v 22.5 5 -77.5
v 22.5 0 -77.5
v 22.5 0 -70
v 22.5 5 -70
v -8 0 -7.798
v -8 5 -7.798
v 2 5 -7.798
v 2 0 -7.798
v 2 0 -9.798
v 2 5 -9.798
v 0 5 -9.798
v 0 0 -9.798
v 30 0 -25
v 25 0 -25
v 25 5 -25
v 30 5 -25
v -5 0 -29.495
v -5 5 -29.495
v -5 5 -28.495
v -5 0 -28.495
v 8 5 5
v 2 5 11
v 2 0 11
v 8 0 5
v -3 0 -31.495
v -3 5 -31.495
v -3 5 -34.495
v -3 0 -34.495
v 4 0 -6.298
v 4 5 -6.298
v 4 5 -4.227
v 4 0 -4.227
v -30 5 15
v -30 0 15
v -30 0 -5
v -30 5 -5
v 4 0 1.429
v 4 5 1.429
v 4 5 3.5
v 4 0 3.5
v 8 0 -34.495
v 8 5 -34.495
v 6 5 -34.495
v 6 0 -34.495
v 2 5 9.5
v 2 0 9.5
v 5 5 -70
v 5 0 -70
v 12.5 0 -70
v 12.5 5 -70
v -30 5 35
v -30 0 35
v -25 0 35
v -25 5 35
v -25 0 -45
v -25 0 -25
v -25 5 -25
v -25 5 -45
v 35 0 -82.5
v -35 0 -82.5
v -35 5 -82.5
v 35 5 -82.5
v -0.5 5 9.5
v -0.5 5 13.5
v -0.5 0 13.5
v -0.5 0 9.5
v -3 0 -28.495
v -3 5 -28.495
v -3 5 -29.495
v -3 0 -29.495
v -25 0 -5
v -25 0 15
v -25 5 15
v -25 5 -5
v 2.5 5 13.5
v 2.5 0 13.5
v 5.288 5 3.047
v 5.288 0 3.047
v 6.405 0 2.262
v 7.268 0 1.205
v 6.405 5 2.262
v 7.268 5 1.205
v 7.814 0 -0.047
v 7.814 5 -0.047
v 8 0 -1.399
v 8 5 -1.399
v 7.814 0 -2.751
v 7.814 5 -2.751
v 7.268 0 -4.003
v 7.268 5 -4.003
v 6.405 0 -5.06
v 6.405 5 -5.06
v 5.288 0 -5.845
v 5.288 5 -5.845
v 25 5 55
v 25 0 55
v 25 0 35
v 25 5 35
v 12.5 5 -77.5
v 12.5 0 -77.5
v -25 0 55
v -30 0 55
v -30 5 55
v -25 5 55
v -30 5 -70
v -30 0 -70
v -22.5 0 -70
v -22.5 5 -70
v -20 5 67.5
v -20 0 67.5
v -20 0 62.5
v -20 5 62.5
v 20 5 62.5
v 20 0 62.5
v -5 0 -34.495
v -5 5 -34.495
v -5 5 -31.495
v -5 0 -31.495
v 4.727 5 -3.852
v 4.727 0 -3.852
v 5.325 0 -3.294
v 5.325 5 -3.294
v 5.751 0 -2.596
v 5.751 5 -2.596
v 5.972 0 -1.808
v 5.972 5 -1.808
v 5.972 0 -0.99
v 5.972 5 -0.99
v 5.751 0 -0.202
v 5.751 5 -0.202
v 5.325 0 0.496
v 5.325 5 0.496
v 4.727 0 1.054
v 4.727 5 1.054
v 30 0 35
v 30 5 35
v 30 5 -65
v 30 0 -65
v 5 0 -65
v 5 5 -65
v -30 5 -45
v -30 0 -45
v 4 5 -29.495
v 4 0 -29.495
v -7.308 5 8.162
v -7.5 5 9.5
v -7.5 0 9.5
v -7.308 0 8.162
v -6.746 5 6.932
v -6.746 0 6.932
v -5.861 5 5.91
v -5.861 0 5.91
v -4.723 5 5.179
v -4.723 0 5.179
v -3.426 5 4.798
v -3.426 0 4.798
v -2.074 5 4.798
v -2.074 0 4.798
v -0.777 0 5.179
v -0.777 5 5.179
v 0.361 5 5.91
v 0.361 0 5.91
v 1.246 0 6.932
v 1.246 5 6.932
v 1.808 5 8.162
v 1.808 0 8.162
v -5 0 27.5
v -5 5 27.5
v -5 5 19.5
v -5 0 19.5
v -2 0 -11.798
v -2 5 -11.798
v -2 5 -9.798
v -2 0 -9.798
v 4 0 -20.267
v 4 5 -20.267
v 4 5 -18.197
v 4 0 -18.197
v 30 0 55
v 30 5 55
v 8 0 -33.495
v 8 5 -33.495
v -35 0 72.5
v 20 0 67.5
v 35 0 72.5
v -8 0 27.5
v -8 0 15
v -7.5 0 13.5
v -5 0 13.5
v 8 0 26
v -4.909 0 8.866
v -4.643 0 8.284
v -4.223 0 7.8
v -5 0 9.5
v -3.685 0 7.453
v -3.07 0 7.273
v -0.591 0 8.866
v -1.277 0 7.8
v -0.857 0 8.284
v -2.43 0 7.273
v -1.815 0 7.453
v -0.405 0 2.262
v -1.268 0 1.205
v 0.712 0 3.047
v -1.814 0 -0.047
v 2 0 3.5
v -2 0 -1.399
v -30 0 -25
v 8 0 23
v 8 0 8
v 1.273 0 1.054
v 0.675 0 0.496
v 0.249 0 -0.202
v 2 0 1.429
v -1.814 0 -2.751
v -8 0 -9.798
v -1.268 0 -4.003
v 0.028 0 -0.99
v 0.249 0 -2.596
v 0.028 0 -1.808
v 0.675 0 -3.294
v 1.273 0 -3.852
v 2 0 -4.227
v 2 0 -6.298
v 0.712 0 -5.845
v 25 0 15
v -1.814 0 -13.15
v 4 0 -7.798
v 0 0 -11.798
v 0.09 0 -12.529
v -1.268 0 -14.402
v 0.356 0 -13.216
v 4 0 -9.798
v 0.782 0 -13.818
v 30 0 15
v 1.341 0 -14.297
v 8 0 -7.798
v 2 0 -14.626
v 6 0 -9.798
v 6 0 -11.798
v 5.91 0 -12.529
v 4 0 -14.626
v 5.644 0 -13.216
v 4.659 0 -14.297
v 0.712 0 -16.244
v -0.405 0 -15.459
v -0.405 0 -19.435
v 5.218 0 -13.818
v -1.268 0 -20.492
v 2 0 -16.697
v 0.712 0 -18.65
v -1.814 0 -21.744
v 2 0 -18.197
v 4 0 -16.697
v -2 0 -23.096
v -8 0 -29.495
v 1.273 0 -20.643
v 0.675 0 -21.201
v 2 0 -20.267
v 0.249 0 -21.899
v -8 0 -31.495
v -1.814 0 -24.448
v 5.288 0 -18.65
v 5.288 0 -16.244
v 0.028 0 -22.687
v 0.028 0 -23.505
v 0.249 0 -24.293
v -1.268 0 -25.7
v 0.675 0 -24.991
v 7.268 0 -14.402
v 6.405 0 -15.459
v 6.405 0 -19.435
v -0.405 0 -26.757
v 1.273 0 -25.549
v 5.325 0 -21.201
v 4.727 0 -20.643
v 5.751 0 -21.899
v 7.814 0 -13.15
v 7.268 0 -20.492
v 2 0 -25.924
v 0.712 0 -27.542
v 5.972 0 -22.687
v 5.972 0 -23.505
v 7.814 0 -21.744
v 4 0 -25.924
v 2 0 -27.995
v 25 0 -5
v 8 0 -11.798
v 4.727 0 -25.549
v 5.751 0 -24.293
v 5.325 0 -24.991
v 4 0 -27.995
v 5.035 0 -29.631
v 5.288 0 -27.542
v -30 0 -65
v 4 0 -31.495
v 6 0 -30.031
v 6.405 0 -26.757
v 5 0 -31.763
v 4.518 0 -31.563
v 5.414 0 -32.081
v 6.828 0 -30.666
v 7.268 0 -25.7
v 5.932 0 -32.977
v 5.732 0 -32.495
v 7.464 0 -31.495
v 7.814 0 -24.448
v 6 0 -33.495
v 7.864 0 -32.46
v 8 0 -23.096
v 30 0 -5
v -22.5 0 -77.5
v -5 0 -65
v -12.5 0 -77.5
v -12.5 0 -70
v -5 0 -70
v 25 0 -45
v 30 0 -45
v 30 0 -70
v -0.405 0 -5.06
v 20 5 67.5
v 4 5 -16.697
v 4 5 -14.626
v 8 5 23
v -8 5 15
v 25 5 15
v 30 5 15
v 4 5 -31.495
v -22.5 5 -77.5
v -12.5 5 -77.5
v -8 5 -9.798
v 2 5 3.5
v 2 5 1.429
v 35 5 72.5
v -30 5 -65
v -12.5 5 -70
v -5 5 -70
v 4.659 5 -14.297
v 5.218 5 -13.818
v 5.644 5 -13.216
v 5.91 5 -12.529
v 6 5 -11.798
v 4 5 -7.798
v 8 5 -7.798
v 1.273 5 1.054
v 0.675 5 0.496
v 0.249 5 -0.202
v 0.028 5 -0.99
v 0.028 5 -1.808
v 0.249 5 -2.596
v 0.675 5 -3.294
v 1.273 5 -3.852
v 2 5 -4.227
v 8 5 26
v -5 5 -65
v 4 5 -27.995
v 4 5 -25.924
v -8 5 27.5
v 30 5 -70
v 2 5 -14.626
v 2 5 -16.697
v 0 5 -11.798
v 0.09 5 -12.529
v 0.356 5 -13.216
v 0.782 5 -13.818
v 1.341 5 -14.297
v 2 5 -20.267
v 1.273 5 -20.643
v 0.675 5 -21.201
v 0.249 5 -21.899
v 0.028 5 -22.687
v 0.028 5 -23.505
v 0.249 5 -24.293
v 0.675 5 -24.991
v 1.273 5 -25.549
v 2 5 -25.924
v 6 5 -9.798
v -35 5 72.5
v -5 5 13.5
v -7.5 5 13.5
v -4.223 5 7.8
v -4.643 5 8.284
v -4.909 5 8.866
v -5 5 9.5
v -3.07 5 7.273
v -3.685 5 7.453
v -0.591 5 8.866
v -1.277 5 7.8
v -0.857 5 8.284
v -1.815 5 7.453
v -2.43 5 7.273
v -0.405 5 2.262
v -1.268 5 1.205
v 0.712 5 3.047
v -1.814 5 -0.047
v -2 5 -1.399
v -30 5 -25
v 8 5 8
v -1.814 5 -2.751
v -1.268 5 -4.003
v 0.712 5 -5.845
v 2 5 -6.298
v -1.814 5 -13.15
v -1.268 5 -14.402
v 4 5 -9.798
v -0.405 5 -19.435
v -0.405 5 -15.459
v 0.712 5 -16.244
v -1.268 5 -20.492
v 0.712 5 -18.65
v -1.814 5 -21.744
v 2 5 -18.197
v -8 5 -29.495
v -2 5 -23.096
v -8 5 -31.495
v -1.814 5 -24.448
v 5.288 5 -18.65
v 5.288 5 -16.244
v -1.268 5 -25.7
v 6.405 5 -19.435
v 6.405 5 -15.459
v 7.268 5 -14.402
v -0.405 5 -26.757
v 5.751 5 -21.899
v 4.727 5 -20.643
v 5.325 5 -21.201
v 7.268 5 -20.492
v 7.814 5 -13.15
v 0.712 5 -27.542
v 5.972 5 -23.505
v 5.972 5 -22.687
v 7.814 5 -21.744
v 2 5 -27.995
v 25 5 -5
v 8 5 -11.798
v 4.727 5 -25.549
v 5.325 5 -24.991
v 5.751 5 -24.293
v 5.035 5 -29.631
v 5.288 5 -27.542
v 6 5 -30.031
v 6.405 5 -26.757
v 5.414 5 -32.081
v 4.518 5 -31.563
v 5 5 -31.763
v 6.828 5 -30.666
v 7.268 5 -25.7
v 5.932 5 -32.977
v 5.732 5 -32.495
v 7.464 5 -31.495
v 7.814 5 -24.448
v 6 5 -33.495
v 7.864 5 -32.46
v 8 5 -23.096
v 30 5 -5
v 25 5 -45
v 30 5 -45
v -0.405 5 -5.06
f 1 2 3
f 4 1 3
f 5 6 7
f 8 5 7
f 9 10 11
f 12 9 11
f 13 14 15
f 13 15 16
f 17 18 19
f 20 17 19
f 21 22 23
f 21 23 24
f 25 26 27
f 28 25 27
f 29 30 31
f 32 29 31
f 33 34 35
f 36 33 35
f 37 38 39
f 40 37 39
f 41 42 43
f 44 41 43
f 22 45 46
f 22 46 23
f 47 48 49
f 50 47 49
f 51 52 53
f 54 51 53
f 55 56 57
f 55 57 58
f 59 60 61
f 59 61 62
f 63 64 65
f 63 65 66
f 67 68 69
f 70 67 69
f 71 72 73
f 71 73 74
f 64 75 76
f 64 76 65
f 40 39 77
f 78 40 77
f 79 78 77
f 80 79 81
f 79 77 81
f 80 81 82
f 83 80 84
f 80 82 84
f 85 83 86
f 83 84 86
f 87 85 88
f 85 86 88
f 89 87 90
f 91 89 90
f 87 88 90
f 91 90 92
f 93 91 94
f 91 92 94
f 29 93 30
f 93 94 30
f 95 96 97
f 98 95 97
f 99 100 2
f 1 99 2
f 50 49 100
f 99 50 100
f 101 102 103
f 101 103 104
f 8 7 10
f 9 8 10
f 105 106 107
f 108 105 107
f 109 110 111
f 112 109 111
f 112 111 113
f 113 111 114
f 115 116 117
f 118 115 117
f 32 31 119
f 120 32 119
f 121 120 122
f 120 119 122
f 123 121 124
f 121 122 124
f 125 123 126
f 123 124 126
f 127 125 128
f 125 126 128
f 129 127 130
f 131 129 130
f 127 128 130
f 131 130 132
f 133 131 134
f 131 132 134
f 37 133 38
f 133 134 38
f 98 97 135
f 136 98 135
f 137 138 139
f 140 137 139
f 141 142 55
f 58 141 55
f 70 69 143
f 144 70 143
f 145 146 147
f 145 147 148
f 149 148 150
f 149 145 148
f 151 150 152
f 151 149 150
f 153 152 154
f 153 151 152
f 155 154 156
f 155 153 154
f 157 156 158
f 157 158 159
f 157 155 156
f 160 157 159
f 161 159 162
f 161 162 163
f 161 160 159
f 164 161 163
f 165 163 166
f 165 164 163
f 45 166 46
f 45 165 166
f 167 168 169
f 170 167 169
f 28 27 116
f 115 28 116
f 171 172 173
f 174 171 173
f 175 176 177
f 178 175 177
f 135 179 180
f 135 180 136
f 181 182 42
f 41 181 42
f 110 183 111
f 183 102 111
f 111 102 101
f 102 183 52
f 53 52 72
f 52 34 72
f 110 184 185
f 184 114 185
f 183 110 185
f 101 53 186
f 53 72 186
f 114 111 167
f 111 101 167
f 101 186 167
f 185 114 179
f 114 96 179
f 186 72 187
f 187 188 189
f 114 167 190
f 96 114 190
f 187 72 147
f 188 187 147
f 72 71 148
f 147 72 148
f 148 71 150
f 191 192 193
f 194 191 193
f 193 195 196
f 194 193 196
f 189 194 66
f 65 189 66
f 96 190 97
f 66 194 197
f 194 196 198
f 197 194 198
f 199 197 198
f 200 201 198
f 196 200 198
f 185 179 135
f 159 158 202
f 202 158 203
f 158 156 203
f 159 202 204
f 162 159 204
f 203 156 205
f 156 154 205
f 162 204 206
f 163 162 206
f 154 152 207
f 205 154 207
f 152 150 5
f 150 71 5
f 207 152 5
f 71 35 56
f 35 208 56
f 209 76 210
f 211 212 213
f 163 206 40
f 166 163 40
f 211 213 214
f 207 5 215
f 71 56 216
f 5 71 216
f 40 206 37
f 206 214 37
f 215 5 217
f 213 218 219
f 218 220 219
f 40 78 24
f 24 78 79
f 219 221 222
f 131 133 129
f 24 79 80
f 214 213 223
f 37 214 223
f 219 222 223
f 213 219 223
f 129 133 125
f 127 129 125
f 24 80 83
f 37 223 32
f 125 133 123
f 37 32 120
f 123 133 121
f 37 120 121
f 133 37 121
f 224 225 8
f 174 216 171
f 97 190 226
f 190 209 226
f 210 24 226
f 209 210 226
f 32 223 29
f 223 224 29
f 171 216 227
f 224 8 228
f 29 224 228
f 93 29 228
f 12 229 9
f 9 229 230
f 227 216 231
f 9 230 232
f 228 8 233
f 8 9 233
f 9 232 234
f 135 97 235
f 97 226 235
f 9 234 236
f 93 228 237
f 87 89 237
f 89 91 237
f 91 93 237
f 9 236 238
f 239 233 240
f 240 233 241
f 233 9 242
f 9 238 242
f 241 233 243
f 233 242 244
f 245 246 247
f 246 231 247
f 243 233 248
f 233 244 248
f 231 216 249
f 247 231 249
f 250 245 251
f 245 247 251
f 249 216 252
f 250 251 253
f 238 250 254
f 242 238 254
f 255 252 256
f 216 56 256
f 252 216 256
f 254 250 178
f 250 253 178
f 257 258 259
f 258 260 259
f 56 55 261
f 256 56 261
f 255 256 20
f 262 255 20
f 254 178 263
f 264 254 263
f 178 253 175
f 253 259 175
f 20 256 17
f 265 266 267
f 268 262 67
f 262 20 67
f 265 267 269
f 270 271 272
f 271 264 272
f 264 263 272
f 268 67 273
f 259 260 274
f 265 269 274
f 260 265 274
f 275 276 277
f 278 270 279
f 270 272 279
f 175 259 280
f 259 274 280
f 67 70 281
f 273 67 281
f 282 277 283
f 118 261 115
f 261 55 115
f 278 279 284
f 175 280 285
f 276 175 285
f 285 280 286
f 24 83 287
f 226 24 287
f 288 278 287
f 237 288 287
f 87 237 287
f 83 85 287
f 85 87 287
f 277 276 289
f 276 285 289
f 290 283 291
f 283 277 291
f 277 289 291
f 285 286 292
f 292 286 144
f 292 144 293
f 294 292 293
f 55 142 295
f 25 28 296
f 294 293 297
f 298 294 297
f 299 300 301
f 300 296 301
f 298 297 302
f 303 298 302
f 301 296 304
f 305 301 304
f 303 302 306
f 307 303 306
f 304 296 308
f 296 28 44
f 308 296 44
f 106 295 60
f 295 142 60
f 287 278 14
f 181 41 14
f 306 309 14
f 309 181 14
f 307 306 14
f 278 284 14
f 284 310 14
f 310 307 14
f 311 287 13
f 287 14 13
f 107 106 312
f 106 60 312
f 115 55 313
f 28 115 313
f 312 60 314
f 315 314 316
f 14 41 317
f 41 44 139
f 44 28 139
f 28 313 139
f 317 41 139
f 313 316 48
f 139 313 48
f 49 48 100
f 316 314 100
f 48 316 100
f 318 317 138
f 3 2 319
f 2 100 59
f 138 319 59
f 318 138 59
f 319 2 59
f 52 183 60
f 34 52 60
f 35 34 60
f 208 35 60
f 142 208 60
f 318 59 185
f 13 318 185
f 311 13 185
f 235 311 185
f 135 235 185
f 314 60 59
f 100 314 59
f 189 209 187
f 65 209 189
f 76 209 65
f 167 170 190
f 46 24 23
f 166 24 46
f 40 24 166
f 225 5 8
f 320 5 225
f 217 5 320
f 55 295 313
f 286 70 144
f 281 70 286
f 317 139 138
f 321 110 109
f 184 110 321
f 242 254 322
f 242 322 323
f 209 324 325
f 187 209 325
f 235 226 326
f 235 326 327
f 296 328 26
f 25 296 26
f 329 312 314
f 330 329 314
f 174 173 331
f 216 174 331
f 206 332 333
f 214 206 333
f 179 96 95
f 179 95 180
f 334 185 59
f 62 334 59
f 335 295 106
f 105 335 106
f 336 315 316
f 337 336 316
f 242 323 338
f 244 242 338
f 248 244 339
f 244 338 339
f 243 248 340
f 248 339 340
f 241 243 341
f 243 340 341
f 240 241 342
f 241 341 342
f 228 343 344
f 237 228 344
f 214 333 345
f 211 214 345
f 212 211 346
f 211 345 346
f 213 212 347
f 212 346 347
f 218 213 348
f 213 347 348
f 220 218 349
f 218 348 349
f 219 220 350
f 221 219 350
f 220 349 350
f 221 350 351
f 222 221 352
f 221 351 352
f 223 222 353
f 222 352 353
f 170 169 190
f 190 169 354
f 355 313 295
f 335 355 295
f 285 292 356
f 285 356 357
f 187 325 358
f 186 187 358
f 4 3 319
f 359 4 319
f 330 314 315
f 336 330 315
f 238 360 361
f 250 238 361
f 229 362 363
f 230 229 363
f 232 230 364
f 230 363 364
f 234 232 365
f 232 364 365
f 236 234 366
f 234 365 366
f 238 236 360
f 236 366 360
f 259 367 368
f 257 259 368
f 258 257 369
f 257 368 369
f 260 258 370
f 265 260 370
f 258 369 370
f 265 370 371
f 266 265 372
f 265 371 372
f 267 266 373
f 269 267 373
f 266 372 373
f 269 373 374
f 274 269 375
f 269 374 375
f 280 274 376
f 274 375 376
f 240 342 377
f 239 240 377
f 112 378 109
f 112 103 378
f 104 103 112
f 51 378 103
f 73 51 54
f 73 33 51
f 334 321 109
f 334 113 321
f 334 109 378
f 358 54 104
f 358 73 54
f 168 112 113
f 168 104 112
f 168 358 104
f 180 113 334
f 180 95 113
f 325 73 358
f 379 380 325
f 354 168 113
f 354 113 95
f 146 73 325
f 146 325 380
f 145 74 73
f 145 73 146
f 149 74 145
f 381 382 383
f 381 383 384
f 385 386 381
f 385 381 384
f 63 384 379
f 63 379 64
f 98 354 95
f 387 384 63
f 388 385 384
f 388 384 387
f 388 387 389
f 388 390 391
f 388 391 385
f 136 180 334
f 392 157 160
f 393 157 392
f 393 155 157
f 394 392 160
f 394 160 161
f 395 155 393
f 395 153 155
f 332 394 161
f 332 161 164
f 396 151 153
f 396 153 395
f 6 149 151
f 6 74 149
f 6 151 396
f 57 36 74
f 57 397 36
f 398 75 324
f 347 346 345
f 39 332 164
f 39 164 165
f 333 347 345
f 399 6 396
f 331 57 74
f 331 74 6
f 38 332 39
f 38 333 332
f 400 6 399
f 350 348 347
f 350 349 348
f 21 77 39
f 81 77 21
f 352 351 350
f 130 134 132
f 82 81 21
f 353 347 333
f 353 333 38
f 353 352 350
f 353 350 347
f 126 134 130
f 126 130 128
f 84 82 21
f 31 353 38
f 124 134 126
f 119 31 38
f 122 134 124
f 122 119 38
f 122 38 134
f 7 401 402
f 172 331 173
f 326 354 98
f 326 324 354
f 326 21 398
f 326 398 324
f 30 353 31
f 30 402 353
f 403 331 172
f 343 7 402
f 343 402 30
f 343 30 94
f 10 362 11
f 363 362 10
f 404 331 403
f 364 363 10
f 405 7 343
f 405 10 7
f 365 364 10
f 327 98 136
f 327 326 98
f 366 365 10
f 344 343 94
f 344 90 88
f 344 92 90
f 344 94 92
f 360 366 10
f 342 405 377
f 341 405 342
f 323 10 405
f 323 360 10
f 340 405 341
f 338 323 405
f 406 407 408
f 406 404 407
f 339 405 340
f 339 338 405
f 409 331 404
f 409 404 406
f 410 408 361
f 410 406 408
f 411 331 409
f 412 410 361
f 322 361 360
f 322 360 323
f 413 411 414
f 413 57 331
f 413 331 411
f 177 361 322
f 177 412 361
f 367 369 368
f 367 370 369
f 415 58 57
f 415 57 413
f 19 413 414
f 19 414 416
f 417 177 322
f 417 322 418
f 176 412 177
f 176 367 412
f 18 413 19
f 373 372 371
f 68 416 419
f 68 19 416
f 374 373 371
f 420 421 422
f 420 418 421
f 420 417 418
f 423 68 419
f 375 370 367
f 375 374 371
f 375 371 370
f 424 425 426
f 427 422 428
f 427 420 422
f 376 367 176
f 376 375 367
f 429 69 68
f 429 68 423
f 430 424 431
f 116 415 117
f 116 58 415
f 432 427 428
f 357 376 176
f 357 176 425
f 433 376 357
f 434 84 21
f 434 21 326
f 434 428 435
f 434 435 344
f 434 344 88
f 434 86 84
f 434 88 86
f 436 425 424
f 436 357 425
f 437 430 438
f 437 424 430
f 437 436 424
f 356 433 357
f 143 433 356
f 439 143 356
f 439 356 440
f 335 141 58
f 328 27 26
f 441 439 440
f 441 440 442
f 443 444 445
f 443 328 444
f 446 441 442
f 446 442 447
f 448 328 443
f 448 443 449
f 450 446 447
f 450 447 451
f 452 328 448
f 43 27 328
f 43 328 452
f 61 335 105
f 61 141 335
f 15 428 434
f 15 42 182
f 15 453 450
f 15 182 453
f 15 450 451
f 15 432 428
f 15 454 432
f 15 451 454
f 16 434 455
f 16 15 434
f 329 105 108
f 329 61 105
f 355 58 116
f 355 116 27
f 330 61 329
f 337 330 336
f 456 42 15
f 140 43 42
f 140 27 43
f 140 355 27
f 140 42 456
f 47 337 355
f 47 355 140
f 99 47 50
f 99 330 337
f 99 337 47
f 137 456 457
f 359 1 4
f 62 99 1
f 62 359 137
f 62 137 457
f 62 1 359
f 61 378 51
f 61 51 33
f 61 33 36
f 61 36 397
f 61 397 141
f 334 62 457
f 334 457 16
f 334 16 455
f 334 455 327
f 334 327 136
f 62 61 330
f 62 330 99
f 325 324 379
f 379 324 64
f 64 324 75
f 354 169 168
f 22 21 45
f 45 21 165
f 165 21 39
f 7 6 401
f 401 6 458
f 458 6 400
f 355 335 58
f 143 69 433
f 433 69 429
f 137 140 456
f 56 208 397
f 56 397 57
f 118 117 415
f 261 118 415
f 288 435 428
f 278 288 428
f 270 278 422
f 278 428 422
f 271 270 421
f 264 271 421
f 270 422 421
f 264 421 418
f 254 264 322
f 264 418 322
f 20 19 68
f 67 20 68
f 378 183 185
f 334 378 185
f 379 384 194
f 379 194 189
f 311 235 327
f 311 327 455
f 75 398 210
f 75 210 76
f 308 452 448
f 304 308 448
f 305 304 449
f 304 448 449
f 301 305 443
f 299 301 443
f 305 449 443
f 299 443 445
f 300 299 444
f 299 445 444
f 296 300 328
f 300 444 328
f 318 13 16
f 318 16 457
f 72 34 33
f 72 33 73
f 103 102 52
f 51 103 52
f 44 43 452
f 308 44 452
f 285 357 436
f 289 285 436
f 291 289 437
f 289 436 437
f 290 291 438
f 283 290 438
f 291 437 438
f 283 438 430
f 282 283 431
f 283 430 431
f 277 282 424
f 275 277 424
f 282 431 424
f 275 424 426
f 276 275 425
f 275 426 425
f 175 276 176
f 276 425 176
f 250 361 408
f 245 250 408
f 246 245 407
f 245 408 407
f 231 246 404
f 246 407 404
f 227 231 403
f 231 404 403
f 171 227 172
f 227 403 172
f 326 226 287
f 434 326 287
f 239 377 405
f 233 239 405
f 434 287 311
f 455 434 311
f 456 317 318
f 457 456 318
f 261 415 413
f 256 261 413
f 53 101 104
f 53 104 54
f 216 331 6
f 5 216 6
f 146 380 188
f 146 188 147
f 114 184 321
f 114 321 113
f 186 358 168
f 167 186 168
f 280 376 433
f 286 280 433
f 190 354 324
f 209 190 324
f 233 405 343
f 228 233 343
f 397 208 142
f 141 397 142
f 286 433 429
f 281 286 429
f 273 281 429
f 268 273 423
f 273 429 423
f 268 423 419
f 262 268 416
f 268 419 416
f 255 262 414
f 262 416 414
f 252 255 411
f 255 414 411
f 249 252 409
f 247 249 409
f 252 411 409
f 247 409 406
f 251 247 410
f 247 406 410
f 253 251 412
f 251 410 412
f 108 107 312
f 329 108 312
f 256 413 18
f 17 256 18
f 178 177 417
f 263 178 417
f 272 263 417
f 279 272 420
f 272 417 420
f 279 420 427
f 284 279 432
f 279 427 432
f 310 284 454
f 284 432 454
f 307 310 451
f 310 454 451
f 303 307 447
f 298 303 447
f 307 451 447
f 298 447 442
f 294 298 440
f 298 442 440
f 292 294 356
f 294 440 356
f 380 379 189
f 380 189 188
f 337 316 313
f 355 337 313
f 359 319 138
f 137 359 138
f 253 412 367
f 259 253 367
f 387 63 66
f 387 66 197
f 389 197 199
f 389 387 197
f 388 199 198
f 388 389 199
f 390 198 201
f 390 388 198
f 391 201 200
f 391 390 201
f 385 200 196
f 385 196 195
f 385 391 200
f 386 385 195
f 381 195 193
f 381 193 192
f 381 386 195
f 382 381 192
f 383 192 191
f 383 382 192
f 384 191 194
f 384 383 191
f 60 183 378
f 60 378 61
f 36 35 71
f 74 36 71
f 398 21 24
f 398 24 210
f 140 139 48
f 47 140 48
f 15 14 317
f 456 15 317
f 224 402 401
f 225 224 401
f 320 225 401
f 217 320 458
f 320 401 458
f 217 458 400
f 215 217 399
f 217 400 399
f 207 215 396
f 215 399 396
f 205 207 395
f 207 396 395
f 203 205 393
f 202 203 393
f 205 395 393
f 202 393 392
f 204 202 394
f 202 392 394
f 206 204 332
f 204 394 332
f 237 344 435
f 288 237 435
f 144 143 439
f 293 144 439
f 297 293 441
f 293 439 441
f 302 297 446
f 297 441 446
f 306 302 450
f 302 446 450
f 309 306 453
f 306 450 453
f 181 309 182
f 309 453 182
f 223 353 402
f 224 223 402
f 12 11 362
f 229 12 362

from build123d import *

# Parameters (mm, degrees)
ESQUISSE1_W             = 70
ESQUISSE1_H             = 155
ESQUISSE1_W_2           = 5
ESQUISSE1_H_2           = 20
ESQUISSE1_W_3           = 40
ESQUISSE1_H_3           = 5
BOSS_EXTRU_1_DEPTH      = 5
ENL_V_MAT_EXTRU_1_DEPTH = 5


with BuildPart() as part:
    # Esquisse1 → Boss.-Extru.1 (new body)
    with BuildSketch(Plane(origin=(0, 0, 0), x_dir=(1, 0, 0), z_dir=(0, 1, 0))):
        with Locations((0, 5)):
            Rectangle(ESQUISSE1_W, ESQUISSE1_H)
        Polygon((-22.5, 77.5), (-12.5, 77.5), (-12.5, 70), (-5, 70), (-5, 65), (-30, 65), (-30, 70), (-22.5, 70), align=None, mode=Mode.SUBTRACT)
        with Locations((27.5, 35)):
            Rectangle(ESQUISSE1_W_2, ESQUISSE1_H_2, mode=Mode.SUBTRACT)
        with Locations((-27.5, 35)):
            Rectangle(ESQUISSE1_W_2, ESQUISSE1_H_2, mode=Mode.SUBTRACT)
        Polygon((12.5, 77.5), (22.5, 77.5), (22.5, 70), (30, 70), (30, 65), (5, 65), (5, 70), (12.5, 70), align=None, mode=Mode.SUBTRACT)
        with Locations((-27.5, -5)):
            Rectangle(ESQUISSE1_W_2, ESQUISSE1_H_2, mode=Mode.SUBTRACT)
        with Locations((-27.5, -45)):
            Rectangle(ESQUISSE1_W_2, ESQUISSE1_H_2, mode=Mode.SUBTRACT)
        with Locations((27.5, -5)):
            Rectangle(ESQUISSE1_W_2, ESQUISSE1_H_2, mode=Mode.SUBTRACT)
        with Locations((27.5, -45)):
            Rectangle(ESQUISSE1_W_2, ESQUISSE1_H_2, mode=Mode.SUBTRACT)
        with Locations((0, -65)):
            Rectangle(ESQUISSE1_W_3, ESQUISSE1_H_3, mode=Mode.SUBTRACT)
    extrude(amount=BOSS_EXTRU_1_DEPTH)

    # Esquisse2 → Enlèv. mat.-Extru.1 (cut)
    with BuildSketch(Plane(origin=(0, 5, 0), x_dir=(1, 0, 0), z_dir=(0, 1, 0))):
        Polygon((-8, -27.5), (-5, -27.5), (-5, -19.5), (8, -26), (8, -23), (-8, -15), align=None)
        with BuildLine():
            Line((8, -5), (8, -8))
            Line((8, -8), (2.5, -13.5))
            Line((2.5, -13.5), (-0.5, -13.5))
            Line((-0.5, -13.5), (-0.5, -9.5))
            ThreePointArc((-0.5, -9.5), (-2.75, -7.25), (-5, -9.5))
            Line((-5, -9.5), (-5, -13.5))
            Line((-5, -13.5), (-7.5, -13.5))
            Line((-7.5, -13.5), (-7.5, -9.5))
            ThreePointArc((-7.5, -9.5), (-2.75, -4.75), (2, -9.5))
            Line((2, -9.5), (2, -11))
            Line((2, -11), (8, -5))
        make_face()
        with BuildLine():
            Line((2, -3.5), (2, -1.429447639))
            ThreePointArc((2, -1.429447639), (0, 1.398979486), (2, 4.22740661))
            Line((2, 4.22740661), (2, 6.297958971))
            ThreePointArc((2, 6.297958971), (-2, 1.398979486), (2, -3.5))
        make_face()
        with BuildLine():
            Line((4, 6.297958971), (4, 4.22740661))
            ThreePointArc((4, 4.22740661), (6, 1.398979486), (4, -1.429447639))
            Line((4, -1.429447639), (4, -3.5))
            ThreePointArc((4, -3.5), (8, 1.398979486), (4, 6.297958971))
        make_face()
        with BuildLine():
            Line((-8, 7.797958971), (2, 7.797958971))
            Line((2, 7.797958971), (2, 9.797958971))
            Line((2, 9.797958971), (0, 9.797958971))
            Line((0, 9.797958971), (0, 11.797958971))
            ThreePointArc((0, 11.797958971), (0.550510257, 13.530009779), (2, 14.626386096))
            Line((2, 14.626386096), (2, 16.696938457))
            ThreePointArc((2, 16.696938457), (-0.872983346, 14.960236631), (-2, 11.797958971))
            Line((-2, 11.797958971), (-2, 9.797958971))
            Line((-2, 9.797958971), (-8, 9.797958971))
            Line((-8, 9.797958971), (-8, 7.797958971))
        make_face()
        with BuildLine():
            Line((4, 7.797958971), (8, 7.797958971))
            Line((8, 7.797958971), (8, 11.797958971))
            ThreePointArc((8, 11.797958971), (6.872983346, 14.960236631), (4, 16.696938457))
            Line((4, 16.696938457), (4, 14.626386096))
            ThreePointArc((4, 14.626386096), (5.449489743, 13.530009779), (6, 11.797958971))
            Line((6, 11.797958971), (6, 9.797958971))
            Line((6, 9.797958971), (4, 9.797958971))
            Line((4, 9.797958971), (4, 7.797958971))
        make_face()
        with BuildLine():
            Line((2, 18.196938457), (2, 20.267490818))
            ThreePointArc((2, 20.267490818), (0, 23.095917942), (2, 25.924345067))
            Line((2, 25.924345067), (2, 27.994897428))
            ThreePointArc((2, 27.994897428), (-2, 23.095917942), (2, 18.196938457))
        make_face()
        with BuildLine():
            Line((4, 27.994897428), (4, 25.924345067))
            ThreePointArc((4, 25.924345067), (6, 23.095917942), (4, 20.267490818))
            Line((4, 20.267490818), (4, 18.196938457))
            ThreePointArc((4, 18.196938457), (8, 23.095917942), (4, 27.994897428))
        make_face()
        with BuildLine():
            Line((-8, 29.494897428), (-5, 29.494897428))
            Line((-5, 29.494897428), (-5, 28.494897428))
            Line((-5, 28.494897428), (-3, 28.494897428))
            Line((-3, 28.494897428), (-3, 29.494897428))
            Line((-3, 29.494897428), (4, 29.494897428))
            ThreePointArc((4, 29.494897428), (6.828427125, 30.666470303), (8, 33.494897428))
            Line((8, 33.494897428), (8, 34.494897428))
            Line((8, 34.494897428), (6, 34.494897428))
            Line((6, 34.494897428), (6, 33.494897428))
            ThreePointArc((6, 33.494897428), (5.414213562, 32.080683865), (4, 31.494897428))
            Line((4, 31.494897428), (-3, 31.494897428))
            Line((-3, 31.494897428), (-3, 34.494897428))
            Line((-3, 34.494897428), (-5, 34.494897428))
            Line((-5, 34.494897428), (-5, 31.494897428))
            Line((-5, 31.494897428), (-8, 31.494897428))
            Line((-8, 31.494897428), (-8, 29.494897428))
        make_face()
    extrude(amount=-ENL_V_MAT_EXTRU_1_DEPTH, mode=Mode.SUBTRACT)


solid = part.part
